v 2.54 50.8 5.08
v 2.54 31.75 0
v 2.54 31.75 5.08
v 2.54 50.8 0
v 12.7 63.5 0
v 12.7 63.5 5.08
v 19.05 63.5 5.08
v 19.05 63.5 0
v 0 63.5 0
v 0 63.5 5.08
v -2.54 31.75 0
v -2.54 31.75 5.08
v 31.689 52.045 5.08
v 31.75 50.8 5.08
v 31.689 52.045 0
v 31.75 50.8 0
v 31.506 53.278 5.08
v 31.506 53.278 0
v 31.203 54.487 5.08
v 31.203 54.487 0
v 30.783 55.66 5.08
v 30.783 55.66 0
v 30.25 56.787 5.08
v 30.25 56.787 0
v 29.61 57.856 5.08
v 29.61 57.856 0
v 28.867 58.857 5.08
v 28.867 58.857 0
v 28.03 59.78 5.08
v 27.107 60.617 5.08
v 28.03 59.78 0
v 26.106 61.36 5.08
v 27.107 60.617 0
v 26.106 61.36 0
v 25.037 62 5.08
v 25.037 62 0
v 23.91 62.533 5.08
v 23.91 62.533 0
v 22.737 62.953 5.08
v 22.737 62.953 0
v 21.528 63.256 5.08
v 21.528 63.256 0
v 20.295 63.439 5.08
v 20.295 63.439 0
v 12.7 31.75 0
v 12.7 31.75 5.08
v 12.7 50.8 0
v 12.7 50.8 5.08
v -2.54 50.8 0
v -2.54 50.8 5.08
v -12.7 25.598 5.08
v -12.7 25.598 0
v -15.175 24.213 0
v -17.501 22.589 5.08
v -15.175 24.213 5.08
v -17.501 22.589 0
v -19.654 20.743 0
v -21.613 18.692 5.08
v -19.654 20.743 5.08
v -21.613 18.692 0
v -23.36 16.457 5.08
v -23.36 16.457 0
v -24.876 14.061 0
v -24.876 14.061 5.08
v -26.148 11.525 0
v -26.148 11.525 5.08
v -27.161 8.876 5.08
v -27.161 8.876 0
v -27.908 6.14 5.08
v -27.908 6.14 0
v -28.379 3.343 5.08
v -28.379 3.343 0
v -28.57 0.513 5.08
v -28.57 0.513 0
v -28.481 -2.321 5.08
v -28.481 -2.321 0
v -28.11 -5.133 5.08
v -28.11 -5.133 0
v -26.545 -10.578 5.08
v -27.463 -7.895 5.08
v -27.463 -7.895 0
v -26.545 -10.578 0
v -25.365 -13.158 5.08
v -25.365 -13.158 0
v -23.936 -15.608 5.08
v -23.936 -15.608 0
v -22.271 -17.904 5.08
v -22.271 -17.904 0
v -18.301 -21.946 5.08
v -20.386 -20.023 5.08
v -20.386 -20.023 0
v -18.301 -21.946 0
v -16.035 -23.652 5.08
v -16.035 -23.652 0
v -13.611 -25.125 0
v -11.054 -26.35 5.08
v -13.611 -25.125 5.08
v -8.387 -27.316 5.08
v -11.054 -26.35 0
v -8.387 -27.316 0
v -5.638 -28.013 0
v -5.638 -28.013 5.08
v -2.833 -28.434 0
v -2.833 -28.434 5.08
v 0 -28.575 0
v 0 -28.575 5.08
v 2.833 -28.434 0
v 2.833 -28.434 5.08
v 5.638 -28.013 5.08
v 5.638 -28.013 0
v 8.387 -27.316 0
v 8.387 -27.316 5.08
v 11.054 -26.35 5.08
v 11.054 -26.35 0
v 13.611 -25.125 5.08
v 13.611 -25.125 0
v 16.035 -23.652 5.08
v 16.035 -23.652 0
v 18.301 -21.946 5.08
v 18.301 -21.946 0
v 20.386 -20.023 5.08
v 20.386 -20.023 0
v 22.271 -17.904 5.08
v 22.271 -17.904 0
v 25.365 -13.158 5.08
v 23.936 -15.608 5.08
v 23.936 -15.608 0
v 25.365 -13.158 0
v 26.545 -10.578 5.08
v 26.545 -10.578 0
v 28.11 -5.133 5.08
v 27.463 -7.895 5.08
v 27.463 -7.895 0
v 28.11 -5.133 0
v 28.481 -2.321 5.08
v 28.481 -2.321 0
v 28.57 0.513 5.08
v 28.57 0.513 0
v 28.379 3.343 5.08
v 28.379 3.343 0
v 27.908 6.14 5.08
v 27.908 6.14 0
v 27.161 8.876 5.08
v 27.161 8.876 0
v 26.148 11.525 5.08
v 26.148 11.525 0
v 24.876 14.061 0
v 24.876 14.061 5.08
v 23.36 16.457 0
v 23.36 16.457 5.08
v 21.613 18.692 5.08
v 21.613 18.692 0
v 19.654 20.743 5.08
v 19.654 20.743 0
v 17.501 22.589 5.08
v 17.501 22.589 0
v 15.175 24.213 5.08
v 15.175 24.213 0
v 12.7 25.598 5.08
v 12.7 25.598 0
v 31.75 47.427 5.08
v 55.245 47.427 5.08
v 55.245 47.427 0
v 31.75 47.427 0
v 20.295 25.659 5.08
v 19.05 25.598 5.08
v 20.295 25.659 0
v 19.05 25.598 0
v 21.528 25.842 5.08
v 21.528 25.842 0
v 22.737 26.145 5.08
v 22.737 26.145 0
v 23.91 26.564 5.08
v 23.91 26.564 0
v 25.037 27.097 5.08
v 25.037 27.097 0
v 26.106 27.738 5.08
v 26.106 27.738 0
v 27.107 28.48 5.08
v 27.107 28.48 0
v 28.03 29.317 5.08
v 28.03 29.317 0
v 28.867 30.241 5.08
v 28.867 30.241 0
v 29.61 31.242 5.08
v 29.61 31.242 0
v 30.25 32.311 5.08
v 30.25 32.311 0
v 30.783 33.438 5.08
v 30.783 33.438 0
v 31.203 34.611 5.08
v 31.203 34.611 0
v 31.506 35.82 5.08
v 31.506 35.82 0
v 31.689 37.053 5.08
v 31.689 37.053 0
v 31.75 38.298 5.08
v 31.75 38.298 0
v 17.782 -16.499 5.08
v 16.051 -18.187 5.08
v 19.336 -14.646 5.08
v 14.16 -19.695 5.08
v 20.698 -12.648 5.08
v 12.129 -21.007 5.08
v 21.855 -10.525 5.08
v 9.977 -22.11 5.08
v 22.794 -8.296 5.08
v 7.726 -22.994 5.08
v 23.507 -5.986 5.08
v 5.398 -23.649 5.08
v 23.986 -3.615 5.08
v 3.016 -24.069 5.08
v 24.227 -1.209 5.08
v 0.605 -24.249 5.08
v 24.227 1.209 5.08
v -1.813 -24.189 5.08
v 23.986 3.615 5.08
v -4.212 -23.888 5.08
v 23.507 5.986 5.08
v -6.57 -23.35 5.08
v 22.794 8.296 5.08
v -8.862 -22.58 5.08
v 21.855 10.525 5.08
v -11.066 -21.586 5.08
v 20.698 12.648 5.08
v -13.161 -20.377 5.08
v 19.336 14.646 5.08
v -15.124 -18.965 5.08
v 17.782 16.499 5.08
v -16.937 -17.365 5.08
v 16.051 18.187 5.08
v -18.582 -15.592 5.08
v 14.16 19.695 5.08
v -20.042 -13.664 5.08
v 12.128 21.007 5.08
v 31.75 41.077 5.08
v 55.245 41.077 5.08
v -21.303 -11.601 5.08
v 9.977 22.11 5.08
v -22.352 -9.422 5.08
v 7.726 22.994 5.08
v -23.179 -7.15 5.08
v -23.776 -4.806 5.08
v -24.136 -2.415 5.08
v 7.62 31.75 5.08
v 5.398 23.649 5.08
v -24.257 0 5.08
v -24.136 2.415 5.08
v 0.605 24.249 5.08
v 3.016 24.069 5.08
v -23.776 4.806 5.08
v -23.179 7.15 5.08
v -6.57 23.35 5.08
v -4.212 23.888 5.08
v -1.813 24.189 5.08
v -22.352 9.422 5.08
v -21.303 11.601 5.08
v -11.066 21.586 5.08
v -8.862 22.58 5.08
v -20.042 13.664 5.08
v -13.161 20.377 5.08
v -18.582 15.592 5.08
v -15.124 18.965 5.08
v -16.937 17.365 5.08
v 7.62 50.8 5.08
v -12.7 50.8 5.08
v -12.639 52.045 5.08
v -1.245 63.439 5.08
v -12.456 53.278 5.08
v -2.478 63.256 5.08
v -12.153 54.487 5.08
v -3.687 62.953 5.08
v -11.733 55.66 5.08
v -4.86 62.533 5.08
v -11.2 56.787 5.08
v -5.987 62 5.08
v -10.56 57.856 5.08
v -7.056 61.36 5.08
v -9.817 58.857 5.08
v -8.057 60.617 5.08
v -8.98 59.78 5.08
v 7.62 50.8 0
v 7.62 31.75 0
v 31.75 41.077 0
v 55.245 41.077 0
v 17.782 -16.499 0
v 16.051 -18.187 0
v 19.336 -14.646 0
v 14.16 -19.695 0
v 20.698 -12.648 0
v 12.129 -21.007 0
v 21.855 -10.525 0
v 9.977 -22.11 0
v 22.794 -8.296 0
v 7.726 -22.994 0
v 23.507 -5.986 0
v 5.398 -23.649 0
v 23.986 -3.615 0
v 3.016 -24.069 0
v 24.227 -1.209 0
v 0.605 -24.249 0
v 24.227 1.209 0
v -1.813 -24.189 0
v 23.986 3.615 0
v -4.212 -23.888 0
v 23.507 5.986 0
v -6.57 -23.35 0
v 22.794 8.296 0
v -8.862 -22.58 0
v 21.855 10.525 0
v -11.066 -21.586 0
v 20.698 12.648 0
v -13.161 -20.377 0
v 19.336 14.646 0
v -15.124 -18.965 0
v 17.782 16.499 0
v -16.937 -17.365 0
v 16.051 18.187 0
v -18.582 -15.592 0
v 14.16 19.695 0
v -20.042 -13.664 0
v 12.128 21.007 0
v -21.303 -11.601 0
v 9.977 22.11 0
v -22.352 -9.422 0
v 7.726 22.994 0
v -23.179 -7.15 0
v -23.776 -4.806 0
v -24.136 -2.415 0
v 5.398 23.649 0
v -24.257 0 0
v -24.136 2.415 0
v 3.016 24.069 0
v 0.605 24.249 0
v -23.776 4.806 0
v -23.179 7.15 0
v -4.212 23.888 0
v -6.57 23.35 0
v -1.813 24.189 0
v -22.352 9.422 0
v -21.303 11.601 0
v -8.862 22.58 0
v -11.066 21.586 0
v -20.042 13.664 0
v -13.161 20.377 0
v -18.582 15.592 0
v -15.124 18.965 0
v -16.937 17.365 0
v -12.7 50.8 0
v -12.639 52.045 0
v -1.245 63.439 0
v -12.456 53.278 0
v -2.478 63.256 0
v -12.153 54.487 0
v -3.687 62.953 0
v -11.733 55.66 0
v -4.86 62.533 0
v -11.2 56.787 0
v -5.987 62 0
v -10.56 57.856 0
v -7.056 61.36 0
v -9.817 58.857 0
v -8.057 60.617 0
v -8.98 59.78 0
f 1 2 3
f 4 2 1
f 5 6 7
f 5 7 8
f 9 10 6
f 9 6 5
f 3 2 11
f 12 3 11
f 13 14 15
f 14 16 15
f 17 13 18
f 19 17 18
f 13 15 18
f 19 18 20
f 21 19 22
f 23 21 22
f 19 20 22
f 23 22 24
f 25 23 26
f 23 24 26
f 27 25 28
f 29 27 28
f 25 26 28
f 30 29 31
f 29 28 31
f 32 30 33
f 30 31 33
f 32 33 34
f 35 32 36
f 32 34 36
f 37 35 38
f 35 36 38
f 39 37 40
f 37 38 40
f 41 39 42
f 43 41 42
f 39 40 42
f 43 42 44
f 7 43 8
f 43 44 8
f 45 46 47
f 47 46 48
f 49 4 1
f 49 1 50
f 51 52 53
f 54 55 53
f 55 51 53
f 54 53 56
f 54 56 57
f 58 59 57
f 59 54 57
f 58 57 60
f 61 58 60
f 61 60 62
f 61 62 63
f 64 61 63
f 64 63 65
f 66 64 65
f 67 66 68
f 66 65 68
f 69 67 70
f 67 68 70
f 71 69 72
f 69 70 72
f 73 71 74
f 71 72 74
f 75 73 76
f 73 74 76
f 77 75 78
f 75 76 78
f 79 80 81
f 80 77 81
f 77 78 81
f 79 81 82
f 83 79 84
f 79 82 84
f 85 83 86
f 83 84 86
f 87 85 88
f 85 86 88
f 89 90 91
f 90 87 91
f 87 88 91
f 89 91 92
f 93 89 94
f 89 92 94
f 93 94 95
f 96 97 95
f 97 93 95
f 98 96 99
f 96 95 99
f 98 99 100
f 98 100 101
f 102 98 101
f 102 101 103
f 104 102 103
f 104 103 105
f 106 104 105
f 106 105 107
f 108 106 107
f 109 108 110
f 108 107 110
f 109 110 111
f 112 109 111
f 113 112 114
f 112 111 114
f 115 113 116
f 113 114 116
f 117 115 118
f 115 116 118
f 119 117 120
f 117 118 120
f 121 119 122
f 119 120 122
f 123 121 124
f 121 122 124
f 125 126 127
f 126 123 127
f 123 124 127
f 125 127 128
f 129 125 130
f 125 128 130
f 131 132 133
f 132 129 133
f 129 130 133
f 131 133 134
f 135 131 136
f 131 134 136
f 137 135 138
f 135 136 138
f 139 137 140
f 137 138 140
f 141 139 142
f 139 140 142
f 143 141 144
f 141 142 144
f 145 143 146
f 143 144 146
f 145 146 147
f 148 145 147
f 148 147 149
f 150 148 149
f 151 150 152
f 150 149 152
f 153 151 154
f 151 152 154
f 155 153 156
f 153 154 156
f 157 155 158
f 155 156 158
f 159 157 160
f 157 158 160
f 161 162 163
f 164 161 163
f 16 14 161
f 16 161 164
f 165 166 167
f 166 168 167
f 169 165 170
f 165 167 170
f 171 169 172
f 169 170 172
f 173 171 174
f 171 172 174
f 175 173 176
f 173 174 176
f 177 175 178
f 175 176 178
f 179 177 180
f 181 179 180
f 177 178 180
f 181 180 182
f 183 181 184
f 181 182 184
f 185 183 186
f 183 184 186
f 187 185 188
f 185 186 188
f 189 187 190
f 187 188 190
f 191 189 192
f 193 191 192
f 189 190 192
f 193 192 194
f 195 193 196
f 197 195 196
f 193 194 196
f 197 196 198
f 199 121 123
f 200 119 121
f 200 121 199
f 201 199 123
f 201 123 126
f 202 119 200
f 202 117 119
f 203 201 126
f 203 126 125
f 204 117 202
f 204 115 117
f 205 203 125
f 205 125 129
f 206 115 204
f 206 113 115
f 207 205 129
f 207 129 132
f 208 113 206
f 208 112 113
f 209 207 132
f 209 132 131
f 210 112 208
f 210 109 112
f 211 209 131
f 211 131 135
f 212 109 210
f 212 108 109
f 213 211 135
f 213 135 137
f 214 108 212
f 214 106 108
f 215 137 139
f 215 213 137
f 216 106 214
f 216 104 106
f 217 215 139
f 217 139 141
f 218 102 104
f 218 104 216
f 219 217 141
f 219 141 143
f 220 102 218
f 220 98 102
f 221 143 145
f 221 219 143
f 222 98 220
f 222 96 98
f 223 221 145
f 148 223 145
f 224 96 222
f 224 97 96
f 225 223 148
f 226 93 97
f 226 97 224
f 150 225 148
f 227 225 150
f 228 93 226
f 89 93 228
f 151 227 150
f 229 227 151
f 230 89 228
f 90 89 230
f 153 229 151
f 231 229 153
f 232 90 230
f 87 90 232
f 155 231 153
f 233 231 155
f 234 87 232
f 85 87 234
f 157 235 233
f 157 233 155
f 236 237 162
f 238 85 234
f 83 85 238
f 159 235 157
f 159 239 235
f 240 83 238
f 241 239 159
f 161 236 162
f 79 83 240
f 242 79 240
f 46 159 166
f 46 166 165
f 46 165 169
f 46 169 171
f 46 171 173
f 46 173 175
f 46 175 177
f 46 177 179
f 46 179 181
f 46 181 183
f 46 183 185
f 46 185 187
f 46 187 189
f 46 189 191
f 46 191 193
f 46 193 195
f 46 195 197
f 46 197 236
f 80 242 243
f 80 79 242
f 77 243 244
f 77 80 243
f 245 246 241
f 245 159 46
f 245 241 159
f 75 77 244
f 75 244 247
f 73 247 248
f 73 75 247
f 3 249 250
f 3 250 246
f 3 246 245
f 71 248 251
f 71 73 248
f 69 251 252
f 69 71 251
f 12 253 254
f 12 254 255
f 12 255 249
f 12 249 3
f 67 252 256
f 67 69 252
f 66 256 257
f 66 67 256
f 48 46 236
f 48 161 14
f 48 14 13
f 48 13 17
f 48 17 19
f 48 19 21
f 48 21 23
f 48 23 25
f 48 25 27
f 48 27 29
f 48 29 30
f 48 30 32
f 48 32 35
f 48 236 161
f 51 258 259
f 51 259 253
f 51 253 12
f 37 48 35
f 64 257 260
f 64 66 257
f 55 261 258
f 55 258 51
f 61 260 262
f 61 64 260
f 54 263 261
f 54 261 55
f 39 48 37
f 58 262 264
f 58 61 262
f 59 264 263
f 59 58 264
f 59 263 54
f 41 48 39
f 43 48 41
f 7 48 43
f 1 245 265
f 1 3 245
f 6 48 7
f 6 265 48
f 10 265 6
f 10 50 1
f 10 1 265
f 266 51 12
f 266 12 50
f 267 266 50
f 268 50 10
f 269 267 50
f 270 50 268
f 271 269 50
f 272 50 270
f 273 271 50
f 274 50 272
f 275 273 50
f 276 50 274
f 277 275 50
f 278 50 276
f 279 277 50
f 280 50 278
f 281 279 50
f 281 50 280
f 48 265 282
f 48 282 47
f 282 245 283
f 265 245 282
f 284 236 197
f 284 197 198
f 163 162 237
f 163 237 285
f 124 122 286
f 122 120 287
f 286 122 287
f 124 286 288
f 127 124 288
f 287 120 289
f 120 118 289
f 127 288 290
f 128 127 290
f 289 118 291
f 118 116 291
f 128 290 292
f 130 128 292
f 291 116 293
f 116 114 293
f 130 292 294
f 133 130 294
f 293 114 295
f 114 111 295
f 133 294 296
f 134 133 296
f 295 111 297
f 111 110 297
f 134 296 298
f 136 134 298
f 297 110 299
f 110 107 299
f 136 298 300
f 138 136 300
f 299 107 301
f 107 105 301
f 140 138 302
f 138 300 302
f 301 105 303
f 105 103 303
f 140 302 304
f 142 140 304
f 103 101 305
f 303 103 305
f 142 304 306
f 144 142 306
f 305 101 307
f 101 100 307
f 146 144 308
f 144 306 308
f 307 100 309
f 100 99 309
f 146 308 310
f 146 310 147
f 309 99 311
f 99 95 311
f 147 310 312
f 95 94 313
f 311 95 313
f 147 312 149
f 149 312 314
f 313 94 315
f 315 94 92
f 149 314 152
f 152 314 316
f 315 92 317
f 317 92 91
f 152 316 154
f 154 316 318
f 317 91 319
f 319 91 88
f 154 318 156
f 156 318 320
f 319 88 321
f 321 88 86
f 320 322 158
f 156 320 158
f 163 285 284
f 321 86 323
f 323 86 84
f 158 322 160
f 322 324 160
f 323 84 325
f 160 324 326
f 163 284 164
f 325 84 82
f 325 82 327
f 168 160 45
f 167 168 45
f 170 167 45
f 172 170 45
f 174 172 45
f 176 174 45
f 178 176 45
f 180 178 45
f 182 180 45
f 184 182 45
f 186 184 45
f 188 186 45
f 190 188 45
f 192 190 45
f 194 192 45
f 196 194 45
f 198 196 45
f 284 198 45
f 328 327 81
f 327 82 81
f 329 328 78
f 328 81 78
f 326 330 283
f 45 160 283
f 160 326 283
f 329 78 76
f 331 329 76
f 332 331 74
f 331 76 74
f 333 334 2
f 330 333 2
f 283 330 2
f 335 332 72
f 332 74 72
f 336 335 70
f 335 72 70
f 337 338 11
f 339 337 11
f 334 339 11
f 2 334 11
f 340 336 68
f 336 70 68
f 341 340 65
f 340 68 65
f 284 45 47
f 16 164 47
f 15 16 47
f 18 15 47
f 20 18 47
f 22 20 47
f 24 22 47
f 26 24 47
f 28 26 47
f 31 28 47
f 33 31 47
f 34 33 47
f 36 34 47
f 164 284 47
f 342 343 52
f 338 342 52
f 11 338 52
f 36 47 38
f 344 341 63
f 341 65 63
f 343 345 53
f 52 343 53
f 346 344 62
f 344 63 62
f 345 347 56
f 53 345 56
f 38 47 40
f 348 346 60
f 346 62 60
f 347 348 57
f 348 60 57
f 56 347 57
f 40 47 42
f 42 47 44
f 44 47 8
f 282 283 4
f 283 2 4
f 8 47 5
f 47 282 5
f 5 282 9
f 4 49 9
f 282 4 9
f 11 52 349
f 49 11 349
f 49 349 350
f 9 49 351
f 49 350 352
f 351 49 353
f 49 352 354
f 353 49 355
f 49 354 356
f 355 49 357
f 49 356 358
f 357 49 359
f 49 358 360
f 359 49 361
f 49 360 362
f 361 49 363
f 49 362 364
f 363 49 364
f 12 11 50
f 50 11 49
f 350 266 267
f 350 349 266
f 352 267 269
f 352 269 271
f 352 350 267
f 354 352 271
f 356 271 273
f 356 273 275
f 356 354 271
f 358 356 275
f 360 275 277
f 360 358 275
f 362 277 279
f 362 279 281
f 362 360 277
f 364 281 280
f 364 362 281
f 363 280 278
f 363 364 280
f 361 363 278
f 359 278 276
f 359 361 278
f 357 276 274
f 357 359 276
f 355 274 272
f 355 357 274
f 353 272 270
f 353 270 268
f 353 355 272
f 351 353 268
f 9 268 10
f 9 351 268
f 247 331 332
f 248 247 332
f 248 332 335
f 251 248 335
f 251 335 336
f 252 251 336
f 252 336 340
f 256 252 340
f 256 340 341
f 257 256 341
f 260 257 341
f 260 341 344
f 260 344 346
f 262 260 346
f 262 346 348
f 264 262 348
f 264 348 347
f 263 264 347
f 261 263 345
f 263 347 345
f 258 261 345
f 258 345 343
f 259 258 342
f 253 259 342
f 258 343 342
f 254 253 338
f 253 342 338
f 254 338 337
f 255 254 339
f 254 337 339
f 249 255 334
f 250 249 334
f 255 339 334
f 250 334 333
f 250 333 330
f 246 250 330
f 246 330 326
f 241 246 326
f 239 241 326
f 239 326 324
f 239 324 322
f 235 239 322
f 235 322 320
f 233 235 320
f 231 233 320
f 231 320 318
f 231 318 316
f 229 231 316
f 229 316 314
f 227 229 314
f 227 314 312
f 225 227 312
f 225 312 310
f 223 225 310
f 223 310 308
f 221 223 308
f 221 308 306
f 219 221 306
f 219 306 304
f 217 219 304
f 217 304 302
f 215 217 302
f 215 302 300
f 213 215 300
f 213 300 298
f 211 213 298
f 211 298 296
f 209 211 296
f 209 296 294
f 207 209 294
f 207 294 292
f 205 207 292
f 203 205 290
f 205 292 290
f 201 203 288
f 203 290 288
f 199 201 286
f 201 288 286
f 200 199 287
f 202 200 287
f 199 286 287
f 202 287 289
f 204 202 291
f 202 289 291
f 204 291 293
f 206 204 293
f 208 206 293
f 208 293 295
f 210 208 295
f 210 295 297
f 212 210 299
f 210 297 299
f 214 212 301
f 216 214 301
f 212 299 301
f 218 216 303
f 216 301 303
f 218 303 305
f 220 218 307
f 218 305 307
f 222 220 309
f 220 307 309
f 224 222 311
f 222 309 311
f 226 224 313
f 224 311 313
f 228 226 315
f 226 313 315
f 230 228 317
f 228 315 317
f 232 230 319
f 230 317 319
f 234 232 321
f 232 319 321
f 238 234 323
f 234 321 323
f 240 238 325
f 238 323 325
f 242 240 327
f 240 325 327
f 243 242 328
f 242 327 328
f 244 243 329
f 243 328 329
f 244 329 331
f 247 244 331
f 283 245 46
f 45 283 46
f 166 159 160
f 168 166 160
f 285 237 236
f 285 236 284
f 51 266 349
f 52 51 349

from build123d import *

# Parameters (mm, degrees)
SKETCH1_R           = 28.575
BOSS_EXTRUDE1_DEPTH = 5.08
SKETCH2_W           = 25.4
SKETCH2_H           = 5.08
BOSS_EXTRUDE2_DEPTH = 63.5
SKETCH3_R           = 24.257
CUT_EXTRUDE1_DEPTH  = 50.8
SKETCH4_W           = 5.08
SKETCH4_H           = 19.05
CUT_EXTRUDE2_DEPTH  = 50.8
SKETCH6_W           = 5.08
SKETCH6_H           = 37.902331649
BOSS_EXTRUDE4_DEPTH = 19.05
SKETCH7_W           = 5.08
SKETCH7_H           = 19.05
CUT_EXTRUDE3_DEPTH  = 25.4
FILLET1_R           = 12.7
SKETCH8_W           = 5.08
SKETCH8_H           = 6.35
BOSS_EXTRUDE5_DEPTH = 23.495


with BuildPart() as part:
    # Sketch1 → Boss-Extrude1 (new body)
    with BuildSketch(Plane.XY):
        Circle(SKETCH1_R)
    extrude(amount=BOSS_EXTRUDE1_DEPTH)

    # Sketch2 → Boss-Extrude2 (add)
    with BuildSketch(Plane(origin=(0, 0, 0), x_dir=(1, 0, 0), z_dir=(0, 1, 0))):
        with Locations((0, -2.54)):
            Rectangle(SKETCH2_W, SKETCH2_H)
    extrude(amount=BOSS_EXTRUDE2_DEPTH)

    # Sketch3 → Cut-Extrude1 (cut)
    with BuildSketch(Plane(origin=(0, 0, 0), x_dir=(-1, 0, 0), z_dir=(0, 0, -1))):
        Circle(SKETCH3_R)
    extrude(amount=-CUT_EXTRUDE1_DEPTH, mode=Mode.SUBTRACT)

    # Sketch4 → Cut-Extrude2 (cut)
    with BuildSketch(Plane(origin=(0, 0, 0), x_dir=(-1, 0, 0), z_dir=(0, 0, -1))):
        with Locations((0, 41.275)):
            Rectangle(SKETCH4_W, SKETCH4_H)
    extrude(amount=-CUT_EXTRUDE2_DEPTH, mode=Mode.SUBTRACT)

    # Sketch6 → Boss-Extrude4 (add)
    with BuildSketch(Plane(origin=(12.7, 0, 0), x_dir=(0, 0, -1), z_dir=(1, 0, 0))):
        with Locations((-2.54, 44.548834176)):
            Rectangle(SKETCH6_W, SKETCH6_H)
    extrude(amount=BOSS_EXTRUDE4_DEPTH)

    # Sketch7 → Cut-Extrude3 (cut)
    with BuildSketch(Plane.XY.offset(5.08)):
        with Locations((10.16, 41.275)):
            Rectangle(SKETCH7_W, SKETCH7_H)
    extrude(amount=-CUT_EXTRUDE3_DEPTH, mode=Mode.SUBTRACT)

    # Fillet1
    fillet1_edges = [part.edges().sort_by_distance(p)[0] for p in [
        (-12.7, 63.5, 2.54),
        (31.75, 63.5, 2.54),
        (31.75, 25.597668351, 2.54),
    ]]
    fillet(fillet1_edges, radius=FILLET1_R)

    # Sketch8 → Boss-Extrude5 (add)
    with BuildSketch(Plane(origin=(31.75, 0, 0), x_dir=(0, 0, -1), z_dir=(1, 0, 0))):
        with Locations((-2.54, 44.2518817)):
            Rectangle(SKETCH8_W, SKETCH8_H)
    extrude(amount=BOSS_EXTRUDE5_DEPTH)


solid = part.part
